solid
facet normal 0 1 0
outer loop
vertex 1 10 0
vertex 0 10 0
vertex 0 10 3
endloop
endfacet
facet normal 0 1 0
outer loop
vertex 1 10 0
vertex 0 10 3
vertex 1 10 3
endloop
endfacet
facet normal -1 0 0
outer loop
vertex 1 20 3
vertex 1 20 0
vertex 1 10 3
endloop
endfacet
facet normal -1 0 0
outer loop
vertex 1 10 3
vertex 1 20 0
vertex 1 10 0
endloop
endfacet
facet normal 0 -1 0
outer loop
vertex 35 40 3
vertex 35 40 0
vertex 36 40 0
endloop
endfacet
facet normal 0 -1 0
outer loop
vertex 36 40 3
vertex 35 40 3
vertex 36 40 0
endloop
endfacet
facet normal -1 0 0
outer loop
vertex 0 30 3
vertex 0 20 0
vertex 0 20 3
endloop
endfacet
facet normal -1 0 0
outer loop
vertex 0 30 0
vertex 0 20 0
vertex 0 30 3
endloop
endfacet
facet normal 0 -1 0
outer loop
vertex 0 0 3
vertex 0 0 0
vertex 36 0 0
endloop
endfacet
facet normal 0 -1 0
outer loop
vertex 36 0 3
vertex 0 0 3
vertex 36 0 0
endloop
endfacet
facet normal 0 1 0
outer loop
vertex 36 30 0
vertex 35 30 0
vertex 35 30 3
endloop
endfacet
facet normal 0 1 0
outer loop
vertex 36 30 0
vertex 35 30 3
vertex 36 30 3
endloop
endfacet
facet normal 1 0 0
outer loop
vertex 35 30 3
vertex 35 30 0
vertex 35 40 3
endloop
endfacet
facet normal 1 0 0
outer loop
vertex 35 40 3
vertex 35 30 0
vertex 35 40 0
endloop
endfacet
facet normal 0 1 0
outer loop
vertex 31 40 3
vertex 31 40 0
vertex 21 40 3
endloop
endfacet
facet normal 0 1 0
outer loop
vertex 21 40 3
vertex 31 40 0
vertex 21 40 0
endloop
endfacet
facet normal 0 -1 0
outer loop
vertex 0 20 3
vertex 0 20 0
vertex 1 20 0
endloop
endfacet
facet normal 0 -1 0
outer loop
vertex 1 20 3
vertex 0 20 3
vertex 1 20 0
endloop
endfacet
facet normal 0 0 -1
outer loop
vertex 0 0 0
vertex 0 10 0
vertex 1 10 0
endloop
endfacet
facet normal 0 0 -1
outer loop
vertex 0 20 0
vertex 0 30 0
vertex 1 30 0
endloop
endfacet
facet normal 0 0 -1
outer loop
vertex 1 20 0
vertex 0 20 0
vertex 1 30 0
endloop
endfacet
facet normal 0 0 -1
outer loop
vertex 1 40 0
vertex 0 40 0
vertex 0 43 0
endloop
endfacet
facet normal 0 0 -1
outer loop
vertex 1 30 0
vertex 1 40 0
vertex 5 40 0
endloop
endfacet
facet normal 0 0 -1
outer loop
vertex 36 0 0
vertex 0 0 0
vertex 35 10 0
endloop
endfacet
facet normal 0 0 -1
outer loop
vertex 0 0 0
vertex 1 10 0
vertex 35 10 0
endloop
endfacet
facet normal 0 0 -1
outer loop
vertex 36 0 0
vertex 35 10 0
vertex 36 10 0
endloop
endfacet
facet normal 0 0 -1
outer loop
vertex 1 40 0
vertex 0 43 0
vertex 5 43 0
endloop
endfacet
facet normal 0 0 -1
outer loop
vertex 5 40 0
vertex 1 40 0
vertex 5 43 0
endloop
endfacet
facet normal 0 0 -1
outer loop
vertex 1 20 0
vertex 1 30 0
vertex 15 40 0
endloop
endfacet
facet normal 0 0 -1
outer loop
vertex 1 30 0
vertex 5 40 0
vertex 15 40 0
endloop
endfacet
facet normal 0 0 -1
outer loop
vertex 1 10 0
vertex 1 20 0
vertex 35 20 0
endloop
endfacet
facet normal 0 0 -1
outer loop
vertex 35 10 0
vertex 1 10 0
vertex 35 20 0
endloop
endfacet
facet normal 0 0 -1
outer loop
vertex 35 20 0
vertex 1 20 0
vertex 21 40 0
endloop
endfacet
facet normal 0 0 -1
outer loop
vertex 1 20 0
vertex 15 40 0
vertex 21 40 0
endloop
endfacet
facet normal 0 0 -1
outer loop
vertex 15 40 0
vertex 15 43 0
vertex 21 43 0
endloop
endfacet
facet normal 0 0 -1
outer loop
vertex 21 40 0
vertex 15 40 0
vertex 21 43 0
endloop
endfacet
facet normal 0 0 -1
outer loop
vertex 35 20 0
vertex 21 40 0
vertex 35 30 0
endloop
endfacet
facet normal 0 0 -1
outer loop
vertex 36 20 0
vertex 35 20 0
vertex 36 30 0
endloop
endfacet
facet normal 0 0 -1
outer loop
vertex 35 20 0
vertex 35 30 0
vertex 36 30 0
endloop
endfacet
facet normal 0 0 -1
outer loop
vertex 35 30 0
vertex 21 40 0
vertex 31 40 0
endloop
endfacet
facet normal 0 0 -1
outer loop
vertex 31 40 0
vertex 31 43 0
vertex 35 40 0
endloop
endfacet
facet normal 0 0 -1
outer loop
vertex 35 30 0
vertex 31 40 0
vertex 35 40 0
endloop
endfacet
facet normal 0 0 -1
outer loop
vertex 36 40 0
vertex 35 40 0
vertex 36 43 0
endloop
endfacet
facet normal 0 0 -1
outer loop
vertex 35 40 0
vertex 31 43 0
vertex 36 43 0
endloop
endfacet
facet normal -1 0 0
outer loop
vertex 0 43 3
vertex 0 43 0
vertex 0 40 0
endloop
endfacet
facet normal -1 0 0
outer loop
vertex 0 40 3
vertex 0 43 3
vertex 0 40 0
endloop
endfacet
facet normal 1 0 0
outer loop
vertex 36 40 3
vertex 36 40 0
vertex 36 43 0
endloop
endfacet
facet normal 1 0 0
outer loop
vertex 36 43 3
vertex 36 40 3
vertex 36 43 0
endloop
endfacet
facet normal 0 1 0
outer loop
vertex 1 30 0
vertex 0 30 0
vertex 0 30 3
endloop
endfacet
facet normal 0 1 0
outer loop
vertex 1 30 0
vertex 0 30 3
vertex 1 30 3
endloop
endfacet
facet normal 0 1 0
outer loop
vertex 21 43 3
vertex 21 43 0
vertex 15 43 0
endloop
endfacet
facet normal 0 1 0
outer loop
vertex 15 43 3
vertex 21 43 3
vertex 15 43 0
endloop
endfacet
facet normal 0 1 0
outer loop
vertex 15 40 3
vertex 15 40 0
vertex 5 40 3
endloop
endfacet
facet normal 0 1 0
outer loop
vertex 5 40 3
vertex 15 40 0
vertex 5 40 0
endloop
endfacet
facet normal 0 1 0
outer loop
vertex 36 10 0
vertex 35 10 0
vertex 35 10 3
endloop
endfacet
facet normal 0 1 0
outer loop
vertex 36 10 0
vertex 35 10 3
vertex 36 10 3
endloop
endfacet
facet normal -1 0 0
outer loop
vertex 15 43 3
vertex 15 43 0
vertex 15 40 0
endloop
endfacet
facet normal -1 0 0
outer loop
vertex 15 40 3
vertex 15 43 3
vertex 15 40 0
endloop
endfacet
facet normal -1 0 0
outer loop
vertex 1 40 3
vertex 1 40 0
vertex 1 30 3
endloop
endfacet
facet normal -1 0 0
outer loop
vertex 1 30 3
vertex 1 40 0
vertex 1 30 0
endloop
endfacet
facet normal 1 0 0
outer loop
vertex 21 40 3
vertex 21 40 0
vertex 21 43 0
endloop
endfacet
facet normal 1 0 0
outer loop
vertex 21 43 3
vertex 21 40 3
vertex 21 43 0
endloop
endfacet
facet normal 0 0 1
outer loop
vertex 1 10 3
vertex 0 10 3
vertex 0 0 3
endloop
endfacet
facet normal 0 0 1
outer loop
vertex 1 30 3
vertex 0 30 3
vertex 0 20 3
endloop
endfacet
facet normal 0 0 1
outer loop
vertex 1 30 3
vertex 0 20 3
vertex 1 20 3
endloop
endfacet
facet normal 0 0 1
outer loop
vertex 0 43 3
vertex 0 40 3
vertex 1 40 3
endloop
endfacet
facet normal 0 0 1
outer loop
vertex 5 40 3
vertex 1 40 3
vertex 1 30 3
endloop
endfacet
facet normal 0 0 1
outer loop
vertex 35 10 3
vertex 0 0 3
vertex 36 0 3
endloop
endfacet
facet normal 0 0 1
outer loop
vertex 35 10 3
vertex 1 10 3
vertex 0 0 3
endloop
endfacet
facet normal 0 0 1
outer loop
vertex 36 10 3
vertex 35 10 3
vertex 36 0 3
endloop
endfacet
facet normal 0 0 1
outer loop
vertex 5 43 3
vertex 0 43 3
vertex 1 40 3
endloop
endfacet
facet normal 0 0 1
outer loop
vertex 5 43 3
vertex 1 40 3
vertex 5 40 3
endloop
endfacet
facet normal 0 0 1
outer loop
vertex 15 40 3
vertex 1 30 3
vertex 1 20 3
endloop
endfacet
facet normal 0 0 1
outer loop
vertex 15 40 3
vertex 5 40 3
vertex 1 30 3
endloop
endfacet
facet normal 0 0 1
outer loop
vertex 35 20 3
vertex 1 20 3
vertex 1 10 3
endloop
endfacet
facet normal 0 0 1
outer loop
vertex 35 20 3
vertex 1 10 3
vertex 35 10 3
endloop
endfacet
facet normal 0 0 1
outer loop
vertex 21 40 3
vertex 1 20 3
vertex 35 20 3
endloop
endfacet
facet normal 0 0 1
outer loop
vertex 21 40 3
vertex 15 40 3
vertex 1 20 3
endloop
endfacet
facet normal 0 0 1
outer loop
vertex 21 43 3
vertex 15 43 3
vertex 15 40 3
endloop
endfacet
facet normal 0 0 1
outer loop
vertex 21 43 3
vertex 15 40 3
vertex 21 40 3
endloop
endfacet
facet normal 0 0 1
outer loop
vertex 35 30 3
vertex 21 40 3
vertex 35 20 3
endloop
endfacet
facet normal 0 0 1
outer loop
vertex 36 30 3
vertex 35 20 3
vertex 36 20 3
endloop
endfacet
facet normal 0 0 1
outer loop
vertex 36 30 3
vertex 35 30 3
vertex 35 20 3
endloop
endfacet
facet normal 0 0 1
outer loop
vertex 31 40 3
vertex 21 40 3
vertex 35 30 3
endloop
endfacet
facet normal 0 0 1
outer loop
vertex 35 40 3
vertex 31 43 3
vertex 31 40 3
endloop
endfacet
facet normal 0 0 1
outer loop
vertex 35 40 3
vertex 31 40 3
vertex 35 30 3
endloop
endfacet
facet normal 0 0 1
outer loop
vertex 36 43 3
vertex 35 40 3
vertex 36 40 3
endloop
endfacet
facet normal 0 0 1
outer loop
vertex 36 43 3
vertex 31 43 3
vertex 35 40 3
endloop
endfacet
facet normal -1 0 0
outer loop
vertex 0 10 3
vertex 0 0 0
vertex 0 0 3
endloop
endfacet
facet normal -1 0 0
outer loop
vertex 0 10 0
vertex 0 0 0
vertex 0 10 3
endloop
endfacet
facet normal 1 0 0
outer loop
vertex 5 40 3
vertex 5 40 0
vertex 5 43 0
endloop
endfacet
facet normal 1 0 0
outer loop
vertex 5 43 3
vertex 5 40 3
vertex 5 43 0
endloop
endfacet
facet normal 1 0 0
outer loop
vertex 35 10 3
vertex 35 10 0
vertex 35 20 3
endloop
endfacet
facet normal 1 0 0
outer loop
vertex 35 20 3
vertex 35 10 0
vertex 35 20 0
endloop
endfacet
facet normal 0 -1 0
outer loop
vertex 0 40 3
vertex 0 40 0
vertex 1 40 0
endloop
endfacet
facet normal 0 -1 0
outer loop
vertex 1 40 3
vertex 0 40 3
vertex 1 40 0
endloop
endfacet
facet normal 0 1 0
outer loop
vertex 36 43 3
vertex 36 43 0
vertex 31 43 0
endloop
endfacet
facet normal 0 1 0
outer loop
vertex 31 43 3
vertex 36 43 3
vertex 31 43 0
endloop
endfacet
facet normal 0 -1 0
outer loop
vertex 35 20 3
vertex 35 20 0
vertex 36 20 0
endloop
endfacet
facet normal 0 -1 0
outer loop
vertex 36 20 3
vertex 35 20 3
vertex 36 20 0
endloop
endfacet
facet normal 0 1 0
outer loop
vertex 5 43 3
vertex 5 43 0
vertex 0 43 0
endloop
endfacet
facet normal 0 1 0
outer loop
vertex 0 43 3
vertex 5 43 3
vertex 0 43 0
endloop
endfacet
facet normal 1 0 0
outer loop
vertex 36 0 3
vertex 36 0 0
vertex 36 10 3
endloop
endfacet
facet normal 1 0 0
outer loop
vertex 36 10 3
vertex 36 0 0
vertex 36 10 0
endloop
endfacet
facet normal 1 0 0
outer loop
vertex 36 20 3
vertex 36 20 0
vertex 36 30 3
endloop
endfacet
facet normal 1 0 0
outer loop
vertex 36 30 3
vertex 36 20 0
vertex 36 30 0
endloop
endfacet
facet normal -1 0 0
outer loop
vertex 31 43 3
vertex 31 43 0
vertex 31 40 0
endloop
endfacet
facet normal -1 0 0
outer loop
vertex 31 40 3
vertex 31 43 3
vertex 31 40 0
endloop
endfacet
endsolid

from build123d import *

# Parameters (mm, degrees)
SKETCH1_W           = 1
SKETCH1_H           = 10
BOSS_EXTRUDE1_DEPTH = 3


with BuildPart() as part:
    # Sketch1 → Boss-Extrude1 (new body)
    with BuildSketch(Plane.XY):
        Polygon((1, 10), (1, 0), (18, 0), (18, 40), (15, 40), (5, 40), (1, 40), (1, 30), (1, 20), align=None)
        Polygon((18, 40), (18, 0), (35, 0), (35, 10), (35, 20), (35, 30), (35, 40), (31, 40), (21, 40), align=None)
        with Locations((0.5, 5)):
            Rectangle(SKETCH1_W, SKETCH1_H)
        with Locations((0.5, 25)):
            Rectangle(SKETCH1_W, SKETCH1_H)
        with Locations((35.5, 25)):
            Rectangle(SKETCH1_W, SKETCH1_H)
        with Locations((35.5, 5)):
            Rectangle(SKETCH1_W, SKETCH1_H)
        Polygon((0, 43), (0, 40), (1, 40), (5, 40), (5, 43), align=None)
        Polygon((15, 40), (18, 40), (21, 40), (21, 43), (15, 43), align=None)
        Polygon((31, 43), (31, 40), (35, 40), (36, 40), (36, 43), align=None)
    extrude(amount=BOSS_EXTRUDE1_DEPTH)


solid = part.part
